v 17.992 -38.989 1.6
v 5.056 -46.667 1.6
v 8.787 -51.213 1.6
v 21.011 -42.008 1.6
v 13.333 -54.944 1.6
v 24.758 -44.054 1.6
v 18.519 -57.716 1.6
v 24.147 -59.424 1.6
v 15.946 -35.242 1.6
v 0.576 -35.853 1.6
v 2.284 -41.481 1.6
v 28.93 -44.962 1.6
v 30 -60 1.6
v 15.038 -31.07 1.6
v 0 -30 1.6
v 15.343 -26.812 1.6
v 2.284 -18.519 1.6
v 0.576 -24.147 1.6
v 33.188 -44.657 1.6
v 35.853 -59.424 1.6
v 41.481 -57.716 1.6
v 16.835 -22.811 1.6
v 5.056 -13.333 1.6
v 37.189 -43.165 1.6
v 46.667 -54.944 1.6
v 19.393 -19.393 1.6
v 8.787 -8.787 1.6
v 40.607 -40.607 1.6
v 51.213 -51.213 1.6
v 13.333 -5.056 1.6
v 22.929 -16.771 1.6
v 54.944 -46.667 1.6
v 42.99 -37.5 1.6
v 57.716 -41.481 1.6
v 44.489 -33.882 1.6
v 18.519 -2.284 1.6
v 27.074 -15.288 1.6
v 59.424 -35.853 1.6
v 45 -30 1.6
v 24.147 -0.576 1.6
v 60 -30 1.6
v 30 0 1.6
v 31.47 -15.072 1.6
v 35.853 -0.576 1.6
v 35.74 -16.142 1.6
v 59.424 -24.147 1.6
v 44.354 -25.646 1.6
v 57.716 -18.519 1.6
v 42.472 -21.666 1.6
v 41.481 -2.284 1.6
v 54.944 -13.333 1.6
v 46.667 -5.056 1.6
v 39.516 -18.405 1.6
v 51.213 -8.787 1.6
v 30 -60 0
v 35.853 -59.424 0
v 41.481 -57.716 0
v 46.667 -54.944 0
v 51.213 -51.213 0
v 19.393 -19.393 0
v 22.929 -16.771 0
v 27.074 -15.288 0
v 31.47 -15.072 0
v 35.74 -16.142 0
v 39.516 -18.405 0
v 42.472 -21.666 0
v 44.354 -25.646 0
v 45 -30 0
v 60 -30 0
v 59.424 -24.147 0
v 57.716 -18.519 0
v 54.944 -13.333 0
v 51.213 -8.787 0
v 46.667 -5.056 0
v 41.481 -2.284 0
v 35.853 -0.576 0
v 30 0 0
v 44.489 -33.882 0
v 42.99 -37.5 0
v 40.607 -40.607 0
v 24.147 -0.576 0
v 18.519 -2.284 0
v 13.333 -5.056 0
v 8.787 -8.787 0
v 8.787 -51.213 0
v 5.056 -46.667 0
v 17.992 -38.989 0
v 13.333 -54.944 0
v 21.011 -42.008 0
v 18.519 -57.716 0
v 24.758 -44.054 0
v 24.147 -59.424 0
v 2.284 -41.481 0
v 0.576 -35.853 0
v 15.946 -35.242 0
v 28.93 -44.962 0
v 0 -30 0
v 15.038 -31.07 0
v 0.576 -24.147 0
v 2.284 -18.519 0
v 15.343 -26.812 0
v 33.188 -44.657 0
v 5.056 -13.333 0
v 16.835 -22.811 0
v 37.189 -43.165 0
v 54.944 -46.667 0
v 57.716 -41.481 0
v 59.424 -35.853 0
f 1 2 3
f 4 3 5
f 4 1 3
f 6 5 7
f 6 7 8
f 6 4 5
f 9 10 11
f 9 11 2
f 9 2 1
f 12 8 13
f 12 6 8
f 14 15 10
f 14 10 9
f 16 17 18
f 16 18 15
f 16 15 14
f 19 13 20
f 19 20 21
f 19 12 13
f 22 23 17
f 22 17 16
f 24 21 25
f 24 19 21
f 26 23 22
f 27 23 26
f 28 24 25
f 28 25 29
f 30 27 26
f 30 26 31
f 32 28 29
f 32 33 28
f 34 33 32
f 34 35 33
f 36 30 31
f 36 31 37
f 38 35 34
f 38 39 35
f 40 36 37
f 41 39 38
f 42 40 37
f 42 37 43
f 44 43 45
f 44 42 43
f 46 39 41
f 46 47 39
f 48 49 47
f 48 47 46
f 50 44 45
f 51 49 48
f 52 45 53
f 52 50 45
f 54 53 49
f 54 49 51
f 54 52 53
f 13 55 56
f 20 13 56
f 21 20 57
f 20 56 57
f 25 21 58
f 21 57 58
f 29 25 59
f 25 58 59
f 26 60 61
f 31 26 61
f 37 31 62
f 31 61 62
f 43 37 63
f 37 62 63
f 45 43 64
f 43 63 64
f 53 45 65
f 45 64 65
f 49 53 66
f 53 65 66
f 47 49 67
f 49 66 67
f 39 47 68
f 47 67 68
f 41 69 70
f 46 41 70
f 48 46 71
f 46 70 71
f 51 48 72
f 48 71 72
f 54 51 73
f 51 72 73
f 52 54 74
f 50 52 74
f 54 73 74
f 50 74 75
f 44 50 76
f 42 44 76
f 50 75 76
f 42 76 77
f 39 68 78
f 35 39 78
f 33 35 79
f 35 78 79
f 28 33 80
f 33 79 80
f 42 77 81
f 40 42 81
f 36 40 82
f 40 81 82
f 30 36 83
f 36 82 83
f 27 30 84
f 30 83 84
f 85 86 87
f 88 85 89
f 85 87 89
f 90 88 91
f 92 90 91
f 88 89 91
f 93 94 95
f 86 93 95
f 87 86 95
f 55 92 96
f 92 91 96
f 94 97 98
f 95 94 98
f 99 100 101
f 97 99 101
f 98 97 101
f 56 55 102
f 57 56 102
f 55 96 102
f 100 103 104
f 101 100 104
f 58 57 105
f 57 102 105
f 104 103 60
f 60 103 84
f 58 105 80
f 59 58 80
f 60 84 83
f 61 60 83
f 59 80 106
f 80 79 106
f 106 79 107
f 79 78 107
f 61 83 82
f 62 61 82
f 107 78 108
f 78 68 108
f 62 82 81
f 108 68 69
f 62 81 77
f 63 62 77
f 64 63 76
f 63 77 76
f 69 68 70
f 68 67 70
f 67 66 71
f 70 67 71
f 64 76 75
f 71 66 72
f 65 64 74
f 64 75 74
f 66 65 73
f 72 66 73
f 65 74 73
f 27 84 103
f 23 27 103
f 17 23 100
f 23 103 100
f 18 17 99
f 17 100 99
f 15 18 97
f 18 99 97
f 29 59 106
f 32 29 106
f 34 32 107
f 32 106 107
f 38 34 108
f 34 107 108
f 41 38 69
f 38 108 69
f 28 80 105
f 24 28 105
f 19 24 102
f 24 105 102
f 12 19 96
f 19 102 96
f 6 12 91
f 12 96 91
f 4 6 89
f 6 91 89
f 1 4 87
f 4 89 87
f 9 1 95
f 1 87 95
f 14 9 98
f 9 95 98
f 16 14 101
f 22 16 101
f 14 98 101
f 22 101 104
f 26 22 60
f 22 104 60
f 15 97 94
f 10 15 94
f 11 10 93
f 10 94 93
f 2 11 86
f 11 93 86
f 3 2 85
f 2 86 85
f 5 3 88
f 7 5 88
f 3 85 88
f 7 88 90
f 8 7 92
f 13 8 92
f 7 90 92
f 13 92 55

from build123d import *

# Parameters (mm, degrees)
F1_DEPTH = 1.6


with BuildPart() as f1:
    # F0 (on Top) → F1 (new body)
    with BuildSketch(Plane.XY):
        with BuildLine():
            ThreePointArc((8.7867965644, -8.7867965644), (2.2836140247, -18.519497029), (0, -30))
            ThreePointArc((0, -30), (8.7867965644, -51.2132034356), (30, -60))
            ThreePointArc((30, -60), (41.480502971, -57.7163859753), (51.2132034356, -51.2132034356))
            Line((51.2132034356, -51.2132034356), (40.6066017178, -40.6066017178))
            ThreePointArc((40.6066017178, -40.6066017178), (19.3933982822, -40.6066017178), (19.3933982822, -19.3933982822))
            Line((19.3933982822, -19.3933982822), (8.7867965644, -8.7867965644))
        make_face()
        with BuildLine():
            ThreePointArc((60, -30), (51.2132034356, -8.7867965644), (30, 0))
            ThreePointArc((30, 0), (18.519497029, -2.2836140247), (8.7867965644, -8.7867965644))
            Line((8.7867965644, -8.7867965644), (19.3933982822, -19.3933982822))
            ThreePointArc((19.3933982822, -19.3933982822), (35.7402514855, -16.1418070123), (45, -30))
            ThreePointArc((45, -30), (43.8581929877, -35.7402514855), (40.6066017178, -40.6066017178))
            Line((40.6066017178, -40.6066017178), (51.2132034356, -51.2132034356))
            ThreePointArc((51.2132034356, -51.2132034356), (57.7163859753, -41.480502971), (60, -30))
        make_face()
    extrude(amount=F1_DEPTH)


solid = f1.part
